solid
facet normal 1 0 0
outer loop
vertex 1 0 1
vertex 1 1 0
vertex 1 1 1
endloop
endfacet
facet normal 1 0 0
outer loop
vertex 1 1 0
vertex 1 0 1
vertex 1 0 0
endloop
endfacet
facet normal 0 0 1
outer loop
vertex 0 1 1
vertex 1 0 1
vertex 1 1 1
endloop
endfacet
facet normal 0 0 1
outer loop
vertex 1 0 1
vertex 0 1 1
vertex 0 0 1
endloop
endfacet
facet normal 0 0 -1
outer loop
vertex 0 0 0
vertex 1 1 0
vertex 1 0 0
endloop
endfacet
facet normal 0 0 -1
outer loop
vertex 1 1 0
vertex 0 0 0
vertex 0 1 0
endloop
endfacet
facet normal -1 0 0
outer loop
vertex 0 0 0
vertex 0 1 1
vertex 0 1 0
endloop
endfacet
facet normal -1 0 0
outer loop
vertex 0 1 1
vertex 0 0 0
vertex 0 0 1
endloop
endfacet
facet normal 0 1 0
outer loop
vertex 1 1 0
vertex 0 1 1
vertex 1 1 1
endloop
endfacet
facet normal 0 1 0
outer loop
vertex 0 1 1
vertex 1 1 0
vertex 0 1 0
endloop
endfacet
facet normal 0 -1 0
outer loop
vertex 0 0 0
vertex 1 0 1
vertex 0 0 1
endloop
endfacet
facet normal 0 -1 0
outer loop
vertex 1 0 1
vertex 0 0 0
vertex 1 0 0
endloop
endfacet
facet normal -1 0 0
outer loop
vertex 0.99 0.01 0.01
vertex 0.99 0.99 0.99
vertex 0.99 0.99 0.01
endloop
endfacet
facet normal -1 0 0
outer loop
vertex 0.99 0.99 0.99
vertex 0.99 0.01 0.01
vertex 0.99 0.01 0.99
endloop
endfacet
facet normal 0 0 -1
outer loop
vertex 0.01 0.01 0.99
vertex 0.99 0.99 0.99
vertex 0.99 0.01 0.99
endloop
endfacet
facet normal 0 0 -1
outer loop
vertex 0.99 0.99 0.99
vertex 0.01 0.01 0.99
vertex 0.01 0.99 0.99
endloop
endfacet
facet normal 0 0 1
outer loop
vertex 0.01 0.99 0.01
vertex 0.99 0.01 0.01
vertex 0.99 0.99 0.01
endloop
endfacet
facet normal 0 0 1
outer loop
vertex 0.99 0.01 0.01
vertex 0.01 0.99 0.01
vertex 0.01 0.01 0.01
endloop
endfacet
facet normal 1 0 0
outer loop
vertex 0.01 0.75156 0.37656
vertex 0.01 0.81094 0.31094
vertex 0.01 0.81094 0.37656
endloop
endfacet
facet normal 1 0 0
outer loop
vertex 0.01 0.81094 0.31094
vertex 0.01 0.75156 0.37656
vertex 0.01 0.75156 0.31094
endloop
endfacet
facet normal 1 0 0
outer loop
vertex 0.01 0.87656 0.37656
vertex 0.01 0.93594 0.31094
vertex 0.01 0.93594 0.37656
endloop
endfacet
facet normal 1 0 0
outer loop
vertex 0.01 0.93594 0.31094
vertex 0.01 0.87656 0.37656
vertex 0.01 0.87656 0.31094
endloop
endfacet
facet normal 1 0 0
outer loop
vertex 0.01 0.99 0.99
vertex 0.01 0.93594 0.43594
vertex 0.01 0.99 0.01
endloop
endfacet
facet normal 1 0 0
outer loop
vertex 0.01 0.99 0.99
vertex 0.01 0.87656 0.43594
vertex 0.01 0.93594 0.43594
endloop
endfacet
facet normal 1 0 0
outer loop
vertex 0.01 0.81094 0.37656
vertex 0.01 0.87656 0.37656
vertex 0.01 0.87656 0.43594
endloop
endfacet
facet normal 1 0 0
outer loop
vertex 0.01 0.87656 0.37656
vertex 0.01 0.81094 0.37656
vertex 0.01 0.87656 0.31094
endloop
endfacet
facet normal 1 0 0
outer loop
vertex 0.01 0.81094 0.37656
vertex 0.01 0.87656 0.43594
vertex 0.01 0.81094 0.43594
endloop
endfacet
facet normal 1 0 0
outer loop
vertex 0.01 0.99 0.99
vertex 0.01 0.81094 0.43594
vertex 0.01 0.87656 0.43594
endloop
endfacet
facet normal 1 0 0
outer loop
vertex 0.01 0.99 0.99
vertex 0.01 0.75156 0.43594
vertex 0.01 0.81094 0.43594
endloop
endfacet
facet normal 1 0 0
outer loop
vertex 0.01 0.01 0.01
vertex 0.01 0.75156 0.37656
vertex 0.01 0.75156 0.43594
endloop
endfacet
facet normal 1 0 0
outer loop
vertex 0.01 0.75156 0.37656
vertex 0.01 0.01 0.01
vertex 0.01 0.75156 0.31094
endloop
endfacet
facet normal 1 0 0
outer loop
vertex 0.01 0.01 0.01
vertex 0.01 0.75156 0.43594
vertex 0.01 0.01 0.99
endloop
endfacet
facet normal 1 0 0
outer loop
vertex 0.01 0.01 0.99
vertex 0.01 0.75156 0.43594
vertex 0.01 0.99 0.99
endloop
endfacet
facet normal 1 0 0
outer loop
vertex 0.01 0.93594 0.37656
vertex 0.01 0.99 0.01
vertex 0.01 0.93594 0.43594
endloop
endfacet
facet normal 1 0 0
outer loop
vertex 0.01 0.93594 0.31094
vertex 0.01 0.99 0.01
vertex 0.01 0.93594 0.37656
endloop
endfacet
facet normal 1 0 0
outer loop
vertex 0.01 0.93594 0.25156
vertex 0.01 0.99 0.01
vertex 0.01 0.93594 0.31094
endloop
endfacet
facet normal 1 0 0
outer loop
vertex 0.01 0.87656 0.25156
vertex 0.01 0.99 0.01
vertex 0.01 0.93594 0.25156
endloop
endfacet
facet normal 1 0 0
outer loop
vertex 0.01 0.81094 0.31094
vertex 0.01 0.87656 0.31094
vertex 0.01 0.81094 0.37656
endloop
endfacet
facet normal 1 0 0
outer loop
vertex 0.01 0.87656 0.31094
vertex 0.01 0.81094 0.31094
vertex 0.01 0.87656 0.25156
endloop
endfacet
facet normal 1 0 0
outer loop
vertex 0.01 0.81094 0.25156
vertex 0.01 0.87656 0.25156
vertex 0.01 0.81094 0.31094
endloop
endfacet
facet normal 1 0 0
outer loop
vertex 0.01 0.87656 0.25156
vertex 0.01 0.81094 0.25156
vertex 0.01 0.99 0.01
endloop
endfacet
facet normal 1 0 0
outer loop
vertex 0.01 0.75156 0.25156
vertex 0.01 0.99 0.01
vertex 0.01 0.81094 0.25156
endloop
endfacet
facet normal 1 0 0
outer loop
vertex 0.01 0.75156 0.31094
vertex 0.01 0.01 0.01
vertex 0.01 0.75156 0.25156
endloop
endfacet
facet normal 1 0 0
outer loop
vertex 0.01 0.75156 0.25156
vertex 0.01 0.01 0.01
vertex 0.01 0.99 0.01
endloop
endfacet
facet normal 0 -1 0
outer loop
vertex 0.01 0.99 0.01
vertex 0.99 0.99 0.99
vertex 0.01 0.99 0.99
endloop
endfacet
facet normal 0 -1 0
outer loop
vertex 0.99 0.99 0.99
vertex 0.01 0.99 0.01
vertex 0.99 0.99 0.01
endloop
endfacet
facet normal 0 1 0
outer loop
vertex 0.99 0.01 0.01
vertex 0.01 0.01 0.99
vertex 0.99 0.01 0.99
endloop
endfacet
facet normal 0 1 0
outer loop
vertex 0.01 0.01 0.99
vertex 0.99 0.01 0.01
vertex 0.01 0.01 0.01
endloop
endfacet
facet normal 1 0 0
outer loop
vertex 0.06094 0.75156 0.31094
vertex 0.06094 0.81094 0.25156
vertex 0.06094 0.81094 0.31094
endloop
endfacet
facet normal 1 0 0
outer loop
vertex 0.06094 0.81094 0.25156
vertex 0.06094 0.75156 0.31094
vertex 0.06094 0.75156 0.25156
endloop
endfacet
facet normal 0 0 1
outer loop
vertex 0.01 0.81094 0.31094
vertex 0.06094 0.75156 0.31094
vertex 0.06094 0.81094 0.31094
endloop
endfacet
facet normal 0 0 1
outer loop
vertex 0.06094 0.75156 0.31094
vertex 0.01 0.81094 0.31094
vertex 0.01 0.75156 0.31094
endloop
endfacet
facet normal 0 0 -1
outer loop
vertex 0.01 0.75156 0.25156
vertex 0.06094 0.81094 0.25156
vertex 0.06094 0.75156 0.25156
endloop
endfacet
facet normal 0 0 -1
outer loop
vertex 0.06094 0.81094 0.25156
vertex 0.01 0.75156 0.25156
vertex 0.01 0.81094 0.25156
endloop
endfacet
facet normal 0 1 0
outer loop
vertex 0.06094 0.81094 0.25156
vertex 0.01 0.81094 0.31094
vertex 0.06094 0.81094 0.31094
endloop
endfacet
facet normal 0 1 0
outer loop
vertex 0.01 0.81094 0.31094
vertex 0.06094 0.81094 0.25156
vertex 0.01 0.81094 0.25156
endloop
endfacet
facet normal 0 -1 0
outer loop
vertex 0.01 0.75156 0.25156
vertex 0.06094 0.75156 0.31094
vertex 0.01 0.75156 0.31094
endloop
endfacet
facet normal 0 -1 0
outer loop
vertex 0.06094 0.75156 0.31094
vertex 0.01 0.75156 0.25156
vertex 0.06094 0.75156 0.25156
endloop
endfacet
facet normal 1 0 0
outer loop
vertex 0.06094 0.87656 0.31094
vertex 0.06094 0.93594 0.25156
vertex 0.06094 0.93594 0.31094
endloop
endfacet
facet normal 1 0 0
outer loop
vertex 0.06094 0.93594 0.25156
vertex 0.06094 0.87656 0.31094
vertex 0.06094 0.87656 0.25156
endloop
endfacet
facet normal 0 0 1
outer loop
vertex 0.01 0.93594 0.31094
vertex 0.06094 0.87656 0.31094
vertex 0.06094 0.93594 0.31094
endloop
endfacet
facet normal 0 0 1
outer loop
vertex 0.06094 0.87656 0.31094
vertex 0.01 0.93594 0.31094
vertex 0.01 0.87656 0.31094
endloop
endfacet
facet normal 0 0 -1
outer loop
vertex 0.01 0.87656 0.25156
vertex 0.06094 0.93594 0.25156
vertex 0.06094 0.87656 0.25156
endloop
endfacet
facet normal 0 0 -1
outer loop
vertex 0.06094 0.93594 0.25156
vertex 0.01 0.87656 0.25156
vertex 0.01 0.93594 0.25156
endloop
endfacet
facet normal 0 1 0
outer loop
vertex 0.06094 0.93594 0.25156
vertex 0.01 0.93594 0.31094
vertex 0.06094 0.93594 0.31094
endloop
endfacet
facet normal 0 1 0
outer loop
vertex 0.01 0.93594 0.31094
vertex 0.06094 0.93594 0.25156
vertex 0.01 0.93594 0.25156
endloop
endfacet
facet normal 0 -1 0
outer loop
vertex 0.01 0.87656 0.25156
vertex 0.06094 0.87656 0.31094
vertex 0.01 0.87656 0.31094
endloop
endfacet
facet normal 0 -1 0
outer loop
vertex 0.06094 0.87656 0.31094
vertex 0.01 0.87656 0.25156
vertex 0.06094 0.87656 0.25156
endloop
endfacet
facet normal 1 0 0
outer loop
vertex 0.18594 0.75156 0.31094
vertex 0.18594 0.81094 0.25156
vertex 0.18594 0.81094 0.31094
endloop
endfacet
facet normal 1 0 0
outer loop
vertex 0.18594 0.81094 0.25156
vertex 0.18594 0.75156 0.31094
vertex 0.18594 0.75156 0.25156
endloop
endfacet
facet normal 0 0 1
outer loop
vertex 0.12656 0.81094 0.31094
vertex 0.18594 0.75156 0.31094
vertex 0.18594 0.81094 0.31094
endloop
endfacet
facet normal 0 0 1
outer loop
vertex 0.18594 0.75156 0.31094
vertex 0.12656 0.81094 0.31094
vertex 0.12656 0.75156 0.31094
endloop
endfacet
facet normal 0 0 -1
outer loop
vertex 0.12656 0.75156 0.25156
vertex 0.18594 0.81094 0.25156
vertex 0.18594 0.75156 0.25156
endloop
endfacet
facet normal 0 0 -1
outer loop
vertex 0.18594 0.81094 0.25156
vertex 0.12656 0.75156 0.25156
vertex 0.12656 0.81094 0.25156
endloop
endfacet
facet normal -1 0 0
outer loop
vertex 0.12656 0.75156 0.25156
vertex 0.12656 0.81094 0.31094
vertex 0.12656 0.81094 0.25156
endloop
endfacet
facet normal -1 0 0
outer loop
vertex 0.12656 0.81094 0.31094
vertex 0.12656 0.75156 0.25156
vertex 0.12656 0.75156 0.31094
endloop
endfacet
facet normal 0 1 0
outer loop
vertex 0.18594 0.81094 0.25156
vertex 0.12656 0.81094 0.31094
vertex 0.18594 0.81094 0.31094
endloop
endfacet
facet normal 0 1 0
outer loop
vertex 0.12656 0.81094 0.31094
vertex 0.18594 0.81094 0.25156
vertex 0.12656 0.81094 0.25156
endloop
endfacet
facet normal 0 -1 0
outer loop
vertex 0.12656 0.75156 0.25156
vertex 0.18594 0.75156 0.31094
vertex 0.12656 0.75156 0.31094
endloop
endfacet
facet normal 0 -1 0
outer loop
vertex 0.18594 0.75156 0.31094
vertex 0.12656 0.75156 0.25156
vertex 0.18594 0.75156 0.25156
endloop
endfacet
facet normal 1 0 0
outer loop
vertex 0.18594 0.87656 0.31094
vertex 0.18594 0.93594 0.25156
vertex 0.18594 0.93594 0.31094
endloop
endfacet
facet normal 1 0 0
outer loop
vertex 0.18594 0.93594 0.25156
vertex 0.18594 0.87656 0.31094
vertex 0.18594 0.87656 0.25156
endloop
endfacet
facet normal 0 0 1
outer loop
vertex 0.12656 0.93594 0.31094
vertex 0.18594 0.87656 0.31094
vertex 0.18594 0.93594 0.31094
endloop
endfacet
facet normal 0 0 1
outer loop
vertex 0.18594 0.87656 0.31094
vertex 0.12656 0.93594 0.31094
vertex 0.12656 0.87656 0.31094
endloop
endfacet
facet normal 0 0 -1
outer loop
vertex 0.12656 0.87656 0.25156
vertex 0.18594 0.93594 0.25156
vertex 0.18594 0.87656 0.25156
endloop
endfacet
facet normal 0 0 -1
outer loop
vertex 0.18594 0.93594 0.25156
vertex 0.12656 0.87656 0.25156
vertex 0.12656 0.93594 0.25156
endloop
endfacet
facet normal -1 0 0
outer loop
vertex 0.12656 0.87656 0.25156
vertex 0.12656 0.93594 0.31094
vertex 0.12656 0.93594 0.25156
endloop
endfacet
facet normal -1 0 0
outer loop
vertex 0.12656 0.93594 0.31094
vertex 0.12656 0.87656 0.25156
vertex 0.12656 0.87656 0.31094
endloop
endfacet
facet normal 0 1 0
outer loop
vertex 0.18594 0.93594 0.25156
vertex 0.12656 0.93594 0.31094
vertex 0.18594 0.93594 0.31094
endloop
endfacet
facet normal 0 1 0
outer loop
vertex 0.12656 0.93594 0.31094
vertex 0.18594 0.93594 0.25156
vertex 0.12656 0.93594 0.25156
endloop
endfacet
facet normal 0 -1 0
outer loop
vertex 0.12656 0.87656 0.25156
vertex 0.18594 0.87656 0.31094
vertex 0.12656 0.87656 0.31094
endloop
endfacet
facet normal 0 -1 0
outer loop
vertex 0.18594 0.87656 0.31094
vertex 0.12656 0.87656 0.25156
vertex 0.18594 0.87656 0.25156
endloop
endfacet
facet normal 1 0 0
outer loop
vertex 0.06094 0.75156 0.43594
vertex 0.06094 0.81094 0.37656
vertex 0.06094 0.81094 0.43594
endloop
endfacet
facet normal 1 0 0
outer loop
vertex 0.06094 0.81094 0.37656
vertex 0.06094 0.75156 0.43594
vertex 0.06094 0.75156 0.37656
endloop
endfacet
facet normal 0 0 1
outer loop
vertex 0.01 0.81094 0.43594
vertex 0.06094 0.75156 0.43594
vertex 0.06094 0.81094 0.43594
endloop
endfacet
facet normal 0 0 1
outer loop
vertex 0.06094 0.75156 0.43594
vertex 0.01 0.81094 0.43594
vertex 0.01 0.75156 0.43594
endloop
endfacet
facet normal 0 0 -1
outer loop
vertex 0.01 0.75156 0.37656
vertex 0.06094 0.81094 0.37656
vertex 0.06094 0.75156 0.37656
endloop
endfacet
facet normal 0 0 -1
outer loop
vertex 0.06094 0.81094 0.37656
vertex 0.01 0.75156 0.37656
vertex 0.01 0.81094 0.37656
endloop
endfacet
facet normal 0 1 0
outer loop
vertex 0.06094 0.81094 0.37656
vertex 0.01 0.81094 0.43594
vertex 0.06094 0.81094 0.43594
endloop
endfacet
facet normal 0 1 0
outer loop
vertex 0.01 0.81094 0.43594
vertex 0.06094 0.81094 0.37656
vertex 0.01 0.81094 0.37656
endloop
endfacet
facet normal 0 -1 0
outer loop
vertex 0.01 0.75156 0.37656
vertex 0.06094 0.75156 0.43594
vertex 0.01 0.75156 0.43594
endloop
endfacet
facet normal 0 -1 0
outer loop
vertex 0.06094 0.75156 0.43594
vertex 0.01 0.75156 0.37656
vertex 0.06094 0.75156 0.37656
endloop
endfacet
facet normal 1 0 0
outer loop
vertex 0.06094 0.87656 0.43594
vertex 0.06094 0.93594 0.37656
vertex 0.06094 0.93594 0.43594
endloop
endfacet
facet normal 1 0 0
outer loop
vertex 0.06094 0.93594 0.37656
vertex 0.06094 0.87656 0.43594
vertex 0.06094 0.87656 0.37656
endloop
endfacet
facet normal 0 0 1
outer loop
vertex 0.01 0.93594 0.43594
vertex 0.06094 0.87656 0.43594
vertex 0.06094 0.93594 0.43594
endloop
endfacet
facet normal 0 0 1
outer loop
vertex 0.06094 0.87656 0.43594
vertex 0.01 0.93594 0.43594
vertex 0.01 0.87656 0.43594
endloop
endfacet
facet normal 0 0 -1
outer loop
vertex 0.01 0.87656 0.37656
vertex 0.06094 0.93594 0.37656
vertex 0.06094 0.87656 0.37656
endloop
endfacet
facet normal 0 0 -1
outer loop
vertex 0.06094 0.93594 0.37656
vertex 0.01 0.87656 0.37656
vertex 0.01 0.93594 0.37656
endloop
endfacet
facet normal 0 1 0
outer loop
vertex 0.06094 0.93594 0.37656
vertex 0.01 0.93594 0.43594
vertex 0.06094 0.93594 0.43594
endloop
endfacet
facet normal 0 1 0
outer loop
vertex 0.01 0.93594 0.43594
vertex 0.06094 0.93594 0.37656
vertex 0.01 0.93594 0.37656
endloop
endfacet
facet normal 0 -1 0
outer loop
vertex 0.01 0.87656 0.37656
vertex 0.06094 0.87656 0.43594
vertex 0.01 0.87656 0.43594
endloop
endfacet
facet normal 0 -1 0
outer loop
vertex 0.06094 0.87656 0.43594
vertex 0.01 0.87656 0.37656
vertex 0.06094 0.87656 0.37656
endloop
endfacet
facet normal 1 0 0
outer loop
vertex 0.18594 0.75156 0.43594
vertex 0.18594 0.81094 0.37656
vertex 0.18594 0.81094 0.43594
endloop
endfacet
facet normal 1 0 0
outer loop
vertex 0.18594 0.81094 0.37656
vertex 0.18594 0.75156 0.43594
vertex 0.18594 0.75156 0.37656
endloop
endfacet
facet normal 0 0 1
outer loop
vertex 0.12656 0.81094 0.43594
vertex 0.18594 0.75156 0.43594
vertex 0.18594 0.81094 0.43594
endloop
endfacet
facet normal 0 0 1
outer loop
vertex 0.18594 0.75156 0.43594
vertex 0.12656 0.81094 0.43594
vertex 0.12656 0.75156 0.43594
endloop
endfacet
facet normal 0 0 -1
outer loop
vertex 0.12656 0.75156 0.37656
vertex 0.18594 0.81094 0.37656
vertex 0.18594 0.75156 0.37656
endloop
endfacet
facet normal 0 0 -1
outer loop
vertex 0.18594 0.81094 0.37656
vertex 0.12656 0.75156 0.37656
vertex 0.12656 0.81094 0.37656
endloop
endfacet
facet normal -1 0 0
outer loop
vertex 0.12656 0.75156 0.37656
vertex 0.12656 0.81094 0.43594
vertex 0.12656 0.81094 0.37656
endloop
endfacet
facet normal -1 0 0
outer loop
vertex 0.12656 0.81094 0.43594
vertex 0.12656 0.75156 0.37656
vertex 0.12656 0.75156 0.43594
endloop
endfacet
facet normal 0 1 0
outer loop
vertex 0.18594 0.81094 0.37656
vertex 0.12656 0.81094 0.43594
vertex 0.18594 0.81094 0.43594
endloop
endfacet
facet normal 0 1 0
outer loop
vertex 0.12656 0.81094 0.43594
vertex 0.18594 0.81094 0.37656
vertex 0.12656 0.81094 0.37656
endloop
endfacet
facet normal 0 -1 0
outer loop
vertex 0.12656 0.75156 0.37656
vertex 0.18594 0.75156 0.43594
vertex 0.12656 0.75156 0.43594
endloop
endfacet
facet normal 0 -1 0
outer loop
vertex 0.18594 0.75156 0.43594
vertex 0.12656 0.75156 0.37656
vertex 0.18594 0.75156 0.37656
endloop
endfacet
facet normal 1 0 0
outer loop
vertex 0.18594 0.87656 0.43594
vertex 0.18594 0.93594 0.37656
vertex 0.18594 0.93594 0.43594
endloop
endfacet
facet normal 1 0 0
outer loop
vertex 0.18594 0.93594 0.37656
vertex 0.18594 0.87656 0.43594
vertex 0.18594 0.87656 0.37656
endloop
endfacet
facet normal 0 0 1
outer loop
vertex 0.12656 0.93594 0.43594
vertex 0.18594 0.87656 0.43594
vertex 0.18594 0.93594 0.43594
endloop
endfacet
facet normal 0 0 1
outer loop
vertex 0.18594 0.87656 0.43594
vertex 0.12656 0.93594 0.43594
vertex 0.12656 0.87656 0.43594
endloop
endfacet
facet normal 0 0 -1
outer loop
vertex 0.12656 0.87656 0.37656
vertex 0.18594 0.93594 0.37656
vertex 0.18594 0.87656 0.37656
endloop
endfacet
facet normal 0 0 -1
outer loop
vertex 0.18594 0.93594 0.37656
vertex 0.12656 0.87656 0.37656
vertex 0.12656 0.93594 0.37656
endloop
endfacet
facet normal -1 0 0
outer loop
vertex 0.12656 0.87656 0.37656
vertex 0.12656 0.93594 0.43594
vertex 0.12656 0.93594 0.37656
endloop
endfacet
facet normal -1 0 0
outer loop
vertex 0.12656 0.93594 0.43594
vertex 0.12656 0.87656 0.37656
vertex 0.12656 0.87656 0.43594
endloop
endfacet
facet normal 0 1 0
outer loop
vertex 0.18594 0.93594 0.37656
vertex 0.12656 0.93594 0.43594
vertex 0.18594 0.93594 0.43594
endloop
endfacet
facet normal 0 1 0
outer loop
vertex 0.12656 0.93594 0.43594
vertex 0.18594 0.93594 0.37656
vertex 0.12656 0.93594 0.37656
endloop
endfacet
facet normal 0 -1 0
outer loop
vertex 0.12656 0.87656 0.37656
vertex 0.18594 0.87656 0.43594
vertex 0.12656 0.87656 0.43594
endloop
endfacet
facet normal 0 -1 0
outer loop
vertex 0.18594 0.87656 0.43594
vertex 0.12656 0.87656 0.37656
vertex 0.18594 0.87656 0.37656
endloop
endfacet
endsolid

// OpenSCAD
translate([0.03125, 0.78125, 0.28125]) color([0.9938355783742772, 0.5564778243748569, 0.9329279768345969]) cube([0.059375, 0.059375, 0.059375], center=true);
translate([0.03125, 0.90625, 0.28125]) color([0.35340897744289224, 0.12062022214202717, 0.7238287945893779]) cube([0.059375, 0.059375, 0.059375], center=true);
translate([0.15625, 0.78125, 0.28125]) color([0.8432397019629626, 0.2883830928152321, 0.23139986036280558]) cube([0.059375, 0.059375, 0.059375], center=true);
translate([0.15625, 0.90625, 0.28125]) color([0.0180364627349191, 0.35314011923198985, 0.9589424474672257]) cube([0.059375, 0.059375, 0.059375], center=true);
translate([0.03125, 0.78125, 0.40625]) color([0.2619290021782883, 0.20369548429490625, 0.5420815487250377]) cube([0.059375, 0.059375, 0.059375], center=true);
translate([0.03125, 0.90625, 0.40625]) color([0.9221305525684157, 0.837748898711002, 0.8622867035840079]) cube([0.059375, 0.059375, 0.059375], center=true);
translate([0.15625, 0.78125, 0.40625]) color([0.727429224436118, 0.821332708873966, 0.2567577523046298]) cube([0.059375, 0.059375, 0.059375], center=true);
translate([0.15625, 0.90625, 0.40625]) color([0.1353372895865157, 0.7613019869252476, 0.15437996216449157]) cube([0.059375, 0.059375, 0.059375], center=true);
color([0.3,0.3,0.3,0.3]) difference() { cube([1,1,1]); translate([0.01,0.01,0.01]) cube([0.98,0.98,0.98]); }
